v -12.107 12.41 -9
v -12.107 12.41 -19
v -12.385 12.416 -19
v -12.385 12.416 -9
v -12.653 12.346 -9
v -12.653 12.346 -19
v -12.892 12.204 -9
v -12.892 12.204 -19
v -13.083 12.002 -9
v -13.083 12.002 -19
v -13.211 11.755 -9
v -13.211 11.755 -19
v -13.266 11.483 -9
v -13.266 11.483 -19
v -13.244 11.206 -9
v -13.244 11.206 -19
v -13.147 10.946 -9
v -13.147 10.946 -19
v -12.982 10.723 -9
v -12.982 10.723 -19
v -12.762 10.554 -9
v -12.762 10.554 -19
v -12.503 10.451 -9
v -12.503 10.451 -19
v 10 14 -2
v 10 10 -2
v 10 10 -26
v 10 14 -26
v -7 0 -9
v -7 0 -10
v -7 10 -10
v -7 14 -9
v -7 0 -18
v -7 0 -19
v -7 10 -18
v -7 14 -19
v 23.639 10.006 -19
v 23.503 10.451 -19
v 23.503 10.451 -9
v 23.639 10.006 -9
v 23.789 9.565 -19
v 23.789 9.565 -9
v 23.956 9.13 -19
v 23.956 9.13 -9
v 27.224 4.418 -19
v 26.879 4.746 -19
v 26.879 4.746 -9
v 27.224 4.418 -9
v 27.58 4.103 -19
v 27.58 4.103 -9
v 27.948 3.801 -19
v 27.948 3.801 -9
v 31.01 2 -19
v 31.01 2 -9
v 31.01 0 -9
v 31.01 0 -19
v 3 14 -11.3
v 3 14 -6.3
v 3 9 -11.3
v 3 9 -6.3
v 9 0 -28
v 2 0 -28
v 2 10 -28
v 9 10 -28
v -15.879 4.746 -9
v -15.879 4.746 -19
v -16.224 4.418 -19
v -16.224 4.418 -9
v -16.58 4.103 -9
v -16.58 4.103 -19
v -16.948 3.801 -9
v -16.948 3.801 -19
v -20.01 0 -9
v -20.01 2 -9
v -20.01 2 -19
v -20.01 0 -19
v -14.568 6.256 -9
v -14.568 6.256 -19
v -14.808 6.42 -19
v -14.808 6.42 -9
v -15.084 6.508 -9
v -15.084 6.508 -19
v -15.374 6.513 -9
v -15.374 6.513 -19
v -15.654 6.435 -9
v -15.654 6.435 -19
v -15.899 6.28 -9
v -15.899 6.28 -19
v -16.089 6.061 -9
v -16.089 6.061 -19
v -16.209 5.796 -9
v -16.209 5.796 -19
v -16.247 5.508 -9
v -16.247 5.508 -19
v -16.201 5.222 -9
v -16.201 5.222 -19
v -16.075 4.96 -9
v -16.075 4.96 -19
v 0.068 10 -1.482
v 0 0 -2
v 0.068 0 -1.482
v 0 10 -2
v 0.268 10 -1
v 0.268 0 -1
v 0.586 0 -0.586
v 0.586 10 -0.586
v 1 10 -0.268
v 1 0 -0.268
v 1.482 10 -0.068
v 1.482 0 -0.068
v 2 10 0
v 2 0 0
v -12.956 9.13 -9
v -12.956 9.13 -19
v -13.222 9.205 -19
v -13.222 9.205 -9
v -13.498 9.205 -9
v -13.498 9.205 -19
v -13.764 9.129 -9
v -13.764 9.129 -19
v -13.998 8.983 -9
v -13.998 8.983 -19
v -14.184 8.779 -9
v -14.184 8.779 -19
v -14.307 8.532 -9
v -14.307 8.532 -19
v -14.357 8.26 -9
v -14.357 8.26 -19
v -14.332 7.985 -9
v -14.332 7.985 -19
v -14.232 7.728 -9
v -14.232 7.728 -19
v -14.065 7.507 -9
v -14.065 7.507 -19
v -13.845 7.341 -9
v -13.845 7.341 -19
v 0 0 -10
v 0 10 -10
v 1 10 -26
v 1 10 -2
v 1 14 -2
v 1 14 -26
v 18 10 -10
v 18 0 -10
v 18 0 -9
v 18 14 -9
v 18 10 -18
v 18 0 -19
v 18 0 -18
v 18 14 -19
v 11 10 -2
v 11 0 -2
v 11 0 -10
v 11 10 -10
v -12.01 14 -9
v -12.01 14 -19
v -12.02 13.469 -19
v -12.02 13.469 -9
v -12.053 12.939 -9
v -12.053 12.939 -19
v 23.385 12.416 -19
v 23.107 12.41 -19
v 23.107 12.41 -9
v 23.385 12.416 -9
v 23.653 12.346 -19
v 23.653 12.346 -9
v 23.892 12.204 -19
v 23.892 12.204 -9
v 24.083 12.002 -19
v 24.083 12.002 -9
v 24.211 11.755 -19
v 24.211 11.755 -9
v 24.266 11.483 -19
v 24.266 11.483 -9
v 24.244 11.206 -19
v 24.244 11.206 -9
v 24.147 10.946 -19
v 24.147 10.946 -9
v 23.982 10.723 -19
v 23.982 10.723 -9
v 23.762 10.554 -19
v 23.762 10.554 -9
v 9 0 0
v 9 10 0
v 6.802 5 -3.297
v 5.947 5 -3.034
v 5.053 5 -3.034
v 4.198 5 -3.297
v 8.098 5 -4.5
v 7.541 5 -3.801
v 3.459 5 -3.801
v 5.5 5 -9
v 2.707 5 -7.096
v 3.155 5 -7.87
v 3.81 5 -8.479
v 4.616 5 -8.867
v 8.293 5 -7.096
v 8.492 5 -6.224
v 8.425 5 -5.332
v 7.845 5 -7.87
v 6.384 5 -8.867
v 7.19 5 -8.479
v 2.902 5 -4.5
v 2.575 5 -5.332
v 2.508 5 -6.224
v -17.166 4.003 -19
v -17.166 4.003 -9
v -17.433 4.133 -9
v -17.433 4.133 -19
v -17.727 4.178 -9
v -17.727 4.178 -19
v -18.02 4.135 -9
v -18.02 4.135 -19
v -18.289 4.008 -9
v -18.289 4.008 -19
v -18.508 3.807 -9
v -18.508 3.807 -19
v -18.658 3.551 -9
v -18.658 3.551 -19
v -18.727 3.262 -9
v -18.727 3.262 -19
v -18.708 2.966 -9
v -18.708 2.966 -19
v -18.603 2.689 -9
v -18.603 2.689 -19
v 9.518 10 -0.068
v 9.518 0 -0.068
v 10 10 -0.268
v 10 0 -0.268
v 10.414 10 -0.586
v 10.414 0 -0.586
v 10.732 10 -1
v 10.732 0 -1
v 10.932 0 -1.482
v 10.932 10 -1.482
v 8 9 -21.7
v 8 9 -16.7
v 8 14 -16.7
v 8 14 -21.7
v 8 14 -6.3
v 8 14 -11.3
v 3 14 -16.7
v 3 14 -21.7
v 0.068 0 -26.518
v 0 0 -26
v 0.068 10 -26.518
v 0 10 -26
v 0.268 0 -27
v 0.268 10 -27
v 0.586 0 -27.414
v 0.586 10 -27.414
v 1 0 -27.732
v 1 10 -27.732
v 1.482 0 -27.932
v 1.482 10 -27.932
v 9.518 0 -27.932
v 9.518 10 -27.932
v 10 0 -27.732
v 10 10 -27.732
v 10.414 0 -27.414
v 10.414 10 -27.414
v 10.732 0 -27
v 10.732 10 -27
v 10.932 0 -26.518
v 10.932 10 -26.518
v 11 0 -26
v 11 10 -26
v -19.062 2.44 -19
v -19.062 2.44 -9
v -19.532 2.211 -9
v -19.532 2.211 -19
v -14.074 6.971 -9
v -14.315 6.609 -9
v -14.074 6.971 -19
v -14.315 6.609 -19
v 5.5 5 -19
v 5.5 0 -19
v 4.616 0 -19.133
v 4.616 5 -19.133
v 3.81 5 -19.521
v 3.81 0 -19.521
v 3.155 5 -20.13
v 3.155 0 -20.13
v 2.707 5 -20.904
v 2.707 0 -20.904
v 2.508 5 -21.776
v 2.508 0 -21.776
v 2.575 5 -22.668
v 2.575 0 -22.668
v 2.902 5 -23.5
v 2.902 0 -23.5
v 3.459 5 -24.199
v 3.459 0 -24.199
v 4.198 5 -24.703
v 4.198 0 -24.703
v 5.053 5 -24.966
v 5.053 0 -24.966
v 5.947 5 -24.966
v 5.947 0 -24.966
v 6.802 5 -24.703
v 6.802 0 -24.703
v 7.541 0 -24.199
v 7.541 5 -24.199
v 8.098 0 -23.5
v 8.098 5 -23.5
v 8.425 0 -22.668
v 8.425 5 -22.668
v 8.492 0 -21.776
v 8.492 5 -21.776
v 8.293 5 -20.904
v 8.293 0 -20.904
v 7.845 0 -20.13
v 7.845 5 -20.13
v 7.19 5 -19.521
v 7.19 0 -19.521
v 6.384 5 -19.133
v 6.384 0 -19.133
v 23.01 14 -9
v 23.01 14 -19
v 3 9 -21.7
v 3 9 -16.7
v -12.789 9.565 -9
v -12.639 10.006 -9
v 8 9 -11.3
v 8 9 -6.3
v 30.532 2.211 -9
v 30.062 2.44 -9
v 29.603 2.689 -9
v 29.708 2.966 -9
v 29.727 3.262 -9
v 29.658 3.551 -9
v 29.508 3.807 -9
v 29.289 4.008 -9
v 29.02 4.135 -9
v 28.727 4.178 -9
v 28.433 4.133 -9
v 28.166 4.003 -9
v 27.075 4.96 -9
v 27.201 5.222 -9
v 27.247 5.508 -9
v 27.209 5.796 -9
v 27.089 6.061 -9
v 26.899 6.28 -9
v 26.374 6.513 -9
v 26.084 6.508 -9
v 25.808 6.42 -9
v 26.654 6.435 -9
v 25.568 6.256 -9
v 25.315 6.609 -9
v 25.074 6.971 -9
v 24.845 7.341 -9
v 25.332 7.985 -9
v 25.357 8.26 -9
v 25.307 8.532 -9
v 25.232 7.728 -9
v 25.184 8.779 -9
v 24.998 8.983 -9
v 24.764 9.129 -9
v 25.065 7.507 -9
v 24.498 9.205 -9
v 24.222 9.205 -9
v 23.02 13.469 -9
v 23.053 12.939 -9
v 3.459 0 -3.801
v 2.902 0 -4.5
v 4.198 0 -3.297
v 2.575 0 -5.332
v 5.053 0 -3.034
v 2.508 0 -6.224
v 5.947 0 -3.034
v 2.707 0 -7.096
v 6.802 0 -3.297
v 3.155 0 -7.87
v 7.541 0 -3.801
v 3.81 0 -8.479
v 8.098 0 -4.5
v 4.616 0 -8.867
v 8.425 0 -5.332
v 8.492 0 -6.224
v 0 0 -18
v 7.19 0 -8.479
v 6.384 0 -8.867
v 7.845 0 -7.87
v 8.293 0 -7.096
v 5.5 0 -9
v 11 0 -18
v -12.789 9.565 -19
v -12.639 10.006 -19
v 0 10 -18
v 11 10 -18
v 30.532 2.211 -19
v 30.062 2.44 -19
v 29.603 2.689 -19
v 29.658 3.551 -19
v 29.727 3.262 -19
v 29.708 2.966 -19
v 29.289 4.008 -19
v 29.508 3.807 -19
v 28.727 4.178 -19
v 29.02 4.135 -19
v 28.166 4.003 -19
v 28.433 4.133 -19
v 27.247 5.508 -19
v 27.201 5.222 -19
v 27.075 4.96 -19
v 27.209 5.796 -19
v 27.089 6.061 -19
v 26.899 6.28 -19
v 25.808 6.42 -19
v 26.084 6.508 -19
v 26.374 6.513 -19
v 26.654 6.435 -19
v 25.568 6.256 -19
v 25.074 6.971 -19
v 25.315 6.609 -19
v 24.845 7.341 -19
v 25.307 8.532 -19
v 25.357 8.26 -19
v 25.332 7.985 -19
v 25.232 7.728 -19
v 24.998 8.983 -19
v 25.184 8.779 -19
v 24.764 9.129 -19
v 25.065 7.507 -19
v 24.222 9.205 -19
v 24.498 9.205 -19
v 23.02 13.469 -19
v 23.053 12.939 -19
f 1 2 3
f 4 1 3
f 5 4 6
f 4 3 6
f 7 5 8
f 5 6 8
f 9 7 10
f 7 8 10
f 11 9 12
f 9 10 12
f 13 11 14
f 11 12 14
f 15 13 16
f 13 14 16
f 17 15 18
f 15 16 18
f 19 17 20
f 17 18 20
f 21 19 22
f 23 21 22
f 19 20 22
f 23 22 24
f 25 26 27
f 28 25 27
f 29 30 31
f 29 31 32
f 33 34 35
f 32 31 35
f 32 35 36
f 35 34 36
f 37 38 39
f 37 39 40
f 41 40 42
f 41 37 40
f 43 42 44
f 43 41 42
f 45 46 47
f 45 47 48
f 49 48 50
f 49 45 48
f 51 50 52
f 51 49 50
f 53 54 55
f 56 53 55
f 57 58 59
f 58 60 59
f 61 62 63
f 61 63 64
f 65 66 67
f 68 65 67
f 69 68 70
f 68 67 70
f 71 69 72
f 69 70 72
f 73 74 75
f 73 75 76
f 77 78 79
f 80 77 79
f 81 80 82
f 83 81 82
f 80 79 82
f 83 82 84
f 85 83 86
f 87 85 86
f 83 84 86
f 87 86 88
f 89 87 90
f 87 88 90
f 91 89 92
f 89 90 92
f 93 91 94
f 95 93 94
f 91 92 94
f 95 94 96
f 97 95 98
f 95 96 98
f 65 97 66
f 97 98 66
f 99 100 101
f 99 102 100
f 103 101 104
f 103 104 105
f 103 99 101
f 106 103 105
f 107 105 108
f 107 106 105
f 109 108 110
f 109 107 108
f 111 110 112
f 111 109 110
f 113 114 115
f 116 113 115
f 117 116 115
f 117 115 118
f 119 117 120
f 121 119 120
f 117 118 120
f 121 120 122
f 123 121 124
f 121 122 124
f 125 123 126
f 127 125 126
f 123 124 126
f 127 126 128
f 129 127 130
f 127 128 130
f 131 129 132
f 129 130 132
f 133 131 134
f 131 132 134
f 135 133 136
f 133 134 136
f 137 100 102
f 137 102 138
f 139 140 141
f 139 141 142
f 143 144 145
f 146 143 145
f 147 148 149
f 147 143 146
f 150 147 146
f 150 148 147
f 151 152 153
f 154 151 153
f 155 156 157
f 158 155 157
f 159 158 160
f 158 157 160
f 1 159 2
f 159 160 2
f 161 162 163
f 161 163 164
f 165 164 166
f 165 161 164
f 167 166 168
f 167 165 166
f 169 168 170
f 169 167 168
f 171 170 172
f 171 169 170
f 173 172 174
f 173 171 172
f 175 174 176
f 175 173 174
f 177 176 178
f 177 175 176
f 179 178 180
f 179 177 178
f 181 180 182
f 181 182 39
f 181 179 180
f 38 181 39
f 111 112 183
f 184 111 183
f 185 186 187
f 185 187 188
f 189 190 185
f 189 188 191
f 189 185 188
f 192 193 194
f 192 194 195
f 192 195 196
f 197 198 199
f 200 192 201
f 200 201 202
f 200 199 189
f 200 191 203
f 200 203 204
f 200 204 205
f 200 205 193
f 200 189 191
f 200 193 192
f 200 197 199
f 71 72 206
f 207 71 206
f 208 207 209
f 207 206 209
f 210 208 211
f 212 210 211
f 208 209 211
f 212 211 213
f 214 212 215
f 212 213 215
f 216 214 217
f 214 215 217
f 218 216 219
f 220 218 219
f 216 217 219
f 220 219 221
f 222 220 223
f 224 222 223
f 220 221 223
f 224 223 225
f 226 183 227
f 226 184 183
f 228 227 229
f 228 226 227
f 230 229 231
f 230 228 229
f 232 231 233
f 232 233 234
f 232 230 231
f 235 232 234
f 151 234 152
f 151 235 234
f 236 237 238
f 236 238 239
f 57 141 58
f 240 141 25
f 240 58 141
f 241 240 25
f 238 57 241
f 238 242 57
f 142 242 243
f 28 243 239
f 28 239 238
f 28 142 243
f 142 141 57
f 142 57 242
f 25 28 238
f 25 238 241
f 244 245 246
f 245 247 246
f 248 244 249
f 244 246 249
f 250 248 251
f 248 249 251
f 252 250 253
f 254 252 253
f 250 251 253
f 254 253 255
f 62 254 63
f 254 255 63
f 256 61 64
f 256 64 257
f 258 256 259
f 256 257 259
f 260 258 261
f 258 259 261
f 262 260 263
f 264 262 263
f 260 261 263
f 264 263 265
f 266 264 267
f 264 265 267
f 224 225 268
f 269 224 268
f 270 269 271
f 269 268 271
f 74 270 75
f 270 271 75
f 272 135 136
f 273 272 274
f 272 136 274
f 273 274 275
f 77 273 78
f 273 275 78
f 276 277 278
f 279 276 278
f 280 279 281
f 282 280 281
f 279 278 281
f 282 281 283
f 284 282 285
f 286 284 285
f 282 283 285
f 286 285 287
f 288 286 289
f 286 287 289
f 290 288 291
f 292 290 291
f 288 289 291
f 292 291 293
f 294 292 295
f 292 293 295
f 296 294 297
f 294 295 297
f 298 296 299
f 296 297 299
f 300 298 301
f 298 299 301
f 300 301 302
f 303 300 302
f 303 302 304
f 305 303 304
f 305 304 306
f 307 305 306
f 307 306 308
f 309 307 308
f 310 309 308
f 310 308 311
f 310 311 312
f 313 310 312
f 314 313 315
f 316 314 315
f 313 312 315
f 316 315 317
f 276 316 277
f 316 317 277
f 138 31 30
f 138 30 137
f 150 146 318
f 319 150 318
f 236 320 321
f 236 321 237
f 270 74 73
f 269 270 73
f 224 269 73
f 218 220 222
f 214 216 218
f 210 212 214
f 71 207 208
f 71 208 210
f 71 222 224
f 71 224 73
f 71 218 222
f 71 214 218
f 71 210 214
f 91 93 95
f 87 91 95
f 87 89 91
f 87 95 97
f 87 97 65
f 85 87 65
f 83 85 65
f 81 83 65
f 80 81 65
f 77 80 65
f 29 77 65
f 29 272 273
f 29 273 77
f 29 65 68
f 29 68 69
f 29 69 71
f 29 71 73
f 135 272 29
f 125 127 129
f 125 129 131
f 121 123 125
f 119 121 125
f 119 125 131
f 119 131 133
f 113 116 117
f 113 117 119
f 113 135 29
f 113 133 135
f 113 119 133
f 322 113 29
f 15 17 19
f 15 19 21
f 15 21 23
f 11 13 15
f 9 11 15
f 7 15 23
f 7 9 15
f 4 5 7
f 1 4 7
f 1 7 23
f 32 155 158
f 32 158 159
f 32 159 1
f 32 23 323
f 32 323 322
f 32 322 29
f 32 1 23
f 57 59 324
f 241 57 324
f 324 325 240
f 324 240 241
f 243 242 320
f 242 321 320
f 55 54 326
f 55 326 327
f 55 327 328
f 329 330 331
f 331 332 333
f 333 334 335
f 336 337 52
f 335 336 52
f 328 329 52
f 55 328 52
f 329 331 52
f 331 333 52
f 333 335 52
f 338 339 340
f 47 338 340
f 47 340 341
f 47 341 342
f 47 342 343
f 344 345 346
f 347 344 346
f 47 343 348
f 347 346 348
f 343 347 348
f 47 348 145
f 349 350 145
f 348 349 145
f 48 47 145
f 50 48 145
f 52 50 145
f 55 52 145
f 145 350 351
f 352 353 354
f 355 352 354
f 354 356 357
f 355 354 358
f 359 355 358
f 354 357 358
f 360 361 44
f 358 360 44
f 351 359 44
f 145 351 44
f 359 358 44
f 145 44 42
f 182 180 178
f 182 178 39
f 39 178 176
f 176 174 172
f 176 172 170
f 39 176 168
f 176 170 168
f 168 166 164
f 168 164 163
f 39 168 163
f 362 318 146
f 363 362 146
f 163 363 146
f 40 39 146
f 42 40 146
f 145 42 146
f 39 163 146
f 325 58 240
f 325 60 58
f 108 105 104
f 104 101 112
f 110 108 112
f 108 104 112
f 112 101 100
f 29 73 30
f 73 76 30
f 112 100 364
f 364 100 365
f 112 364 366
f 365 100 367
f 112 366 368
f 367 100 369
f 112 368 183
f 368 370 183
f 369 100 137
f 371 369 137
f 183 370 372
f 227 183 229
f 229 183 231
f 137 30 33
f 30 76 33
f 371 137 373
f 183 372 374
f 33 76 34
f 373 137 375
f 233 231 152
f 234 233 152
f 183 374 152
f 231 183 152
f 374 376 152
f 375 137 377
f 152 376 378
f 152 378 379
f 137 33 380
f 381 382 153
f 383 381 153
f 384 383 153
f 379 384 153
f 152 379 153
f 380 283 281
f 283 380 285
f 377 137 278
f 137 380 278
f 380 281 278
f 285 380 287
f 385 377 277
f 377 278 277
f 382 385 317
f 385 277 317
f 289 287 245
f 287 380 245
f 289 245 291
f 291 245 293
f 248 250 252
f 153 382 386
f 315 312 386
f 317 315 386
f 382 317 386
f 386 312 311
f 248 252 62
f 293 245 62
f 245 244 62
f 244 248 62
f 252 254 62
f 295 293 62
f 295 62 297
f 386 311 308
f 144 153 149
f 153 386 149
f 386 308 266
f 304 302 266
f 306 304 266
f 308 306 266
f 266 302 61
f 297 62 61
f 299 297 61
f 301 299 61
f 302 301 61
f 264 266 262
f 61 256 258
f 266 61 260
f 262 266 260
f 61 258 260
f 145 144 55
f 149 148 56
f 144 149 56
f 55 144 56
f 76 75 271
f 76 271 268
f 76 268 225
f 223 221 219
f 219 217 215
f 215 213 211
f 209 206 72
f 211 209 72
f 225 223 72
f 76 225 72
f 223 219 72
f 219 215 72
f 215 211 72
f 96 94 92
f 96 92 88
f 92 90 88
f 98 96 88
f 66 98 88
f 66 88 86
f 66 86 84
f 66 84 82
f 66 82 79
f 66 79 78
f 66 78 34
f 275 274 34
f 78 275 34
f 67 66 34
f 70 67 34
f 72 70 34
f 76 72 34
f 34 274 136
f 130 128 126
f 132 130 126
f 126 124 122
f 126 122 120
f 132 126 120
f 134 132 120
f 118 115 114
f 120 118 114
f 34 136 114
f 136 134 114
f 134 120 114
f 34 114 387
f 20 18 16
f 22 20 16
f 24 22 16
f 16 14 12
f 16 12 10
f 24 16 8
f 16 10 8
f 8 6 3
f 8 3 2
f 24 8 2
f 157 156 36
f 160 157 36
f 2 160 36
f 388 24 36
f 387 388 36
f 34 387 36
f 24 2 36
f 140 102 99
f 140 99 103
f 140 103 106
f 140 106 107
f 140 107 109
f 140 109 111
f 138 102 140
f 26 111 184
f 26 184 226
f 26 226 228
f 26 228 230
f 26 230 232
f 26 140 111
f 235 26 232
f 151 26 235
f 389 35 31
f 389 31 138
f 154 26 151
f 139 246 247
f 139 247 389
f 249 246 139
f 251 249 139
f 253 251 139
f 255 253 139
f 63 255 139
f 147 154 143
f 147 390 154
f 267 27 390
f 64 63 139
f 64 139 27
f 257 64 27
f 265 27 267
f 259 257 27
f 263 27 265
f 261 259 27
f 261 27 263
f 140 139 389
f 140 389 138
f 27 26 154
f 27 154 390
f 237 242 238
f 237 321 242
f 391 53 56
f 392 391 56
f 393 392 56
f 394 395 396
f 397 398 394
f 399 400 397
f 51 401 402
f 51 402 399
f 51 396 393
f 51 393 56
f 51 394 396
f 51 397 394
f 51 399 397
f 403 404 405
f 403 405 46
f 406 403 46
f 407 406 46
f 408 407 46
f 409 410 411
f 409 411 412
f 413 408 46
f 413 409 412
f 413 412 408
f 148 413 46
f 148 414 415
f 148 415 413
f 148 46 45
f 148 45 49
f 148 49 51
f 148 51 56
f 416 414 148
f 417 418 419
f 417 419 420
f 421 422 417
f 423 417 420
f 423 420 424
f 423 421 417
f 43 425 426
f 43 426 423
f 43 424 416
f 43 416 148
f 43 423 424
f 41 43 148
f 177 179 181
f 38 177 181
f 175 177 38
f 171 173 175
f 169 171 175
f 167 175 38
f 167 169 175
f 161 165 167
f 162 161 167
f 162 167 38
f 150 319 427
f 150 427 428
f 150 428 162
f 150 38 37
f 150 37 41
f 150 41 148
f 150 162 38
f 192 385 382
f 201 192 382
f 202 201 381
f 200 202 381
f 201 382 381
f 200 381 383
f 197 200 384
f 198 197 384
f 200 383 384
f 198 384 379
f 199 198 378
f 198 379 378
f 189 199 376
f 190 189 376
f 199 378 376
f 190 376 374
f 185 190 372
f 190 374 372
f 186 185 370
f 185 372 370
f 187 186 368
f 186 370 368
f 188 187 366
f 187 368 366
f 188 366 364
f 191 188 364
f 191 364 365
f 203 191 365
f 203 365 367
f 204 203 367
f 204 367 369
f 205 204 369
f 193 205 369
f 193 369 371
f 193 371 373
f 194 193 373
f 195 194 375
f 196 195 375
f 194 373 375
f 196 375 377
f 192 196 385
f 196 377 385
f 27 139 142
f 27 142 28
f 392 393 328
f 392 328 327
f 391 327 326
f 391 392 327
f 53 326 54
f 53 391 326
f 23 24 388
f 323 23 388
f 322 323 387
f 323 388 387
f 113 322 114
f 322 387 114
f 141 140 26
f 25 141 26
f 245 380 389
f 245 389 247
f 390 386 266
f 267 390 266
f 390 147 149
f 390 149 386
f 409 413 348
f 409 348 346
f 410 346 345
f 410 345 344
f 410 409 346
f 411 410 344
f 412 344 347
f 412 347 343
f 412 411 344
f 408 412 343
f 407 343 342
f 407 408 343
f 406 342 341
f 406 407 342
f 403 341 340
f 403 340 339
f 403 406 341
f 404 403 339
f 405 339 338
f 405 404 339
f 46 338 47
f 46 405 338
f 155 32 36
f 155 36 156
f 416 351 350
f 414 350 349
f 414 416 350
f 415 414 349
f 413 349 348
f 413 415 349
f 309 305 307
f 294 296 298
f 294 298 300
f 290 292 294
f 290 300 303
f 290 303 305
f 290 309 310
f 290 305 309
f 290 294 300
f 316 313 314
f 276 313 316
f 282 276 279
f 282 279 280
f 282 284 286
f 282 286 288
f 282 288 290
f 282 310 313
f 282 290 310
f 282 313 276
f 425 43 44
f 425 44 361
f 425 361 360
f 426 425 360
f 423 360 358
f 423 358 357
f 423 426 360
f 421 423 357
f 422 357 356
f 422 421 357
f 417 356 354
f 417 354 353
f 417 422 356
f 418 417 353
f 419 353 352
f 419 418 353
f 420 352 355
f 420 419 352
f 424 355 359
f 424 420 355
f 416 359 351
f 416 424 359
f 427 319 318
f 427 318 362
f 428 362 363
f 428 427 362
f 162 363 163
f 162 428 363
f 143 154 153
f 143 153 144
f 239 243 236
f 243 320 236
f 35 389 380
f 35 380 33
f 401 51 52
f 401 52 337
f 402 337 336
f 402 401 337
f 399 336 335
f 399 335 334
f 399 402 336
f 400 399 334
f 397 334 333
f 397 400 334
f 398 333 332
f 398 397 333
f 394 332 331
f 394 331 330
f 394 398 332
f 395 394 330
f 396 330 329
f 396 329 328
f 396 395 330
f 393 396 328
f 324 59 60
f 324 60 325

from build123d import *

# Parameters (mm, degrees)
SKETCH1_W           = 11
SKETCH1_H           = 28
BOSS_EXTRUDE1_DEPTH = 10
SKETCH2_R           = 3
CUT_EXTRUDE1_DEPTH  = 5
SKETCH3_W           = 5
SKETCH3_H           = 5
CUT_EXTRUDE2_DEPTH  = 1
FILLET1_R           = 2
BOSS_EXTRUDE2_DEPTH = 10
BOSS_EXTRUDE3_DEPTH = 5
SKETCH6_W           = 9
SKETCH6_H           = 24
SKETCH6_W_2         = 5
SKETCH6_H_2         = 5
BOSS_EXTRUDE4_DEPTH = 4


with BuildPart() as part:
    # Sketch1 → Boss-Extrude1 (new body)
    with BuildSketch(Plane(origin=(0, 0, 0), x_dir=(1, 0, 0), z_dir=(0, 1, 0))):
        with Locations((5.5, 14)):
            Rectangle(SKETCH1_W, SKETCH1_H)
    extrude(amount=BOSS_EXTRUDE1_DEPTH)

    # Sketch2 → Cut-Extrude1 (cut)
    with BuildSketch(Plane.XZ):
        with Locations(Location((5.5, -6, 0), (0, 0, 270))):  # turned: the seam where the file's is
            Circle(SKETCH2_R)
        with Locations(Location((5.5, -22, 0), (0, 0, 90))):  # turned: the seam where the file's is
            Circle(SKETCH2_R)
    extrude(amount=-CUT_EXTRUDE1_DEPTH, mode=Mode.SUBTRACT)

    # Sketch3 → Cut-Extrude2 (cut)
    with BuildSketch(Plane(origin=(0, 10, 0), x_dir=(1, 0, 0), z_dir=(0, 1, 0))):
        with Locations((5.5, 8.8)):
            Rectangle(SKETCH3_W, SKETCH3_H)
        with Locations((5.5, 19.2)):
            Rectangle(SKETCH3_W, SKETCH3_H)
    extrude(amount=-CUT_EXTRUDE2_DEPTH, mode=Mode.SUBTRACT)

    # Fillet1
    fillet1_edges = [part.edges().sort_by_distance(p)[0] for p in [
        (0, 5, -28),
        (11, 5, -28),
        (11, 5, 0),
        (0, 5, 0),
    ]]
    fillet(fillet1_edges, radius=FILLET1_R)

    # Sketch4 → Boss-Extrude2 (add)
    with BuildSketch(Plane(origin=(0, 10, 0), x_dir=(1, 0, 0), z_dir=(0, 1, 0))):
        Polygon((-7, 10), (3, 10), (3, 11.3), (8, 11.3), (8, 10), (18, 10), (18, 18), (8, 18), (8, 16.7), (3, 16.7), (3, 18), (-7, 18), align=None)
    extrude(amount=-BOSS_EXTRUDE2_DEPTH)

    # Sketch5 → Boss-Extrude3 (add, symmetric)
    with BuildSketch(Plane(origin=(0, 0, -14), x_dir=(-1, 0, 0), z_dir=(0, 0, -1))):
        with BuildLine():
            Line((-18, 10), (-18, 14))
            Line((-18, 14), (-23.009639132, 14))
            ThreePointArc((-23.009639132, 14), (-23.034060421, 13.203534611), (-23.107232535, 12.410061639))
            ThreePointArc((-23.107232535, 12.410061639), (-24.247773279, 11.621237367), (-23.503399625, 10.451201135))
            ThreePointArc((-23.503399625, 10.451201135), (-23.712034257, 9.784680991), (-23.956162944, 9.130327344))
            ThreePointArc((-23.956162944, 9.130327344), (-25.254024229, 8.659499735), (-24.844635532, 7.340968944))
            ThreePointArc((-24.844635532, 7.340968944), (-25.19276603, 6.789226373), (-25.568138069, 6.255643632))
            ThreePointArc((-25.568138069, 6.255643632), (-27.002153814, 6.177218324), (-26.878916821, 4.74635693))
            ThreePointArc((-26.878916821, 4.74635693), (-27.400685234, 4.259059964), (-27.948418079, 3.801141479))
            ThreePointArc((-27.948418079, 3.801141479), (-29.288657634, 4.007780534), (-29.602553888, 2.688534194))
            ThreePointArc((-29.602553888, 2.688534194), (-30.295715938, 2.323053407), (-31.009639132, 2))
            Line((-31.009639132, 2), (-31.009639132, 0))
            Line((-31.009639132, 0), (-18, 0))
            Line((-18, 0), (-18, 10))
        make_face()
    boss_extrude3 = extrude(amount=BOSS_EXTRUDE3_DEPTH, both=True)

    # Mirror1: Boss-Extrude3 across plane
    add(boss_extrude3.mirror(Plane.ZY.offset(-5.5)))

    # Sketch6 → Boss-Extrude4 (add)
    with BuildSketch(Plane(origin=(0, 10, 0), x_dir=(1, 0, 0), z_dir=(0, 1, 0))):
        with Locations((5.5, 14)):
            Rectangle(SKETCH6_W, SKETCH6_H)
        with Locations((5.5, 19.2)):
            Rectangle(SKETCH6_W_2, SKETCH6_H_2, mode=Mode.SUBTRACT)
        with Locations((5.5, 8.8)):
            Rectangle(SKETCH6_W_2, SKETCH6_H_2, mode=Mode.SUBTRACT)
    extrude(amount=BOSS_EXTRUDE4_DEPTH)


solid = part.part
